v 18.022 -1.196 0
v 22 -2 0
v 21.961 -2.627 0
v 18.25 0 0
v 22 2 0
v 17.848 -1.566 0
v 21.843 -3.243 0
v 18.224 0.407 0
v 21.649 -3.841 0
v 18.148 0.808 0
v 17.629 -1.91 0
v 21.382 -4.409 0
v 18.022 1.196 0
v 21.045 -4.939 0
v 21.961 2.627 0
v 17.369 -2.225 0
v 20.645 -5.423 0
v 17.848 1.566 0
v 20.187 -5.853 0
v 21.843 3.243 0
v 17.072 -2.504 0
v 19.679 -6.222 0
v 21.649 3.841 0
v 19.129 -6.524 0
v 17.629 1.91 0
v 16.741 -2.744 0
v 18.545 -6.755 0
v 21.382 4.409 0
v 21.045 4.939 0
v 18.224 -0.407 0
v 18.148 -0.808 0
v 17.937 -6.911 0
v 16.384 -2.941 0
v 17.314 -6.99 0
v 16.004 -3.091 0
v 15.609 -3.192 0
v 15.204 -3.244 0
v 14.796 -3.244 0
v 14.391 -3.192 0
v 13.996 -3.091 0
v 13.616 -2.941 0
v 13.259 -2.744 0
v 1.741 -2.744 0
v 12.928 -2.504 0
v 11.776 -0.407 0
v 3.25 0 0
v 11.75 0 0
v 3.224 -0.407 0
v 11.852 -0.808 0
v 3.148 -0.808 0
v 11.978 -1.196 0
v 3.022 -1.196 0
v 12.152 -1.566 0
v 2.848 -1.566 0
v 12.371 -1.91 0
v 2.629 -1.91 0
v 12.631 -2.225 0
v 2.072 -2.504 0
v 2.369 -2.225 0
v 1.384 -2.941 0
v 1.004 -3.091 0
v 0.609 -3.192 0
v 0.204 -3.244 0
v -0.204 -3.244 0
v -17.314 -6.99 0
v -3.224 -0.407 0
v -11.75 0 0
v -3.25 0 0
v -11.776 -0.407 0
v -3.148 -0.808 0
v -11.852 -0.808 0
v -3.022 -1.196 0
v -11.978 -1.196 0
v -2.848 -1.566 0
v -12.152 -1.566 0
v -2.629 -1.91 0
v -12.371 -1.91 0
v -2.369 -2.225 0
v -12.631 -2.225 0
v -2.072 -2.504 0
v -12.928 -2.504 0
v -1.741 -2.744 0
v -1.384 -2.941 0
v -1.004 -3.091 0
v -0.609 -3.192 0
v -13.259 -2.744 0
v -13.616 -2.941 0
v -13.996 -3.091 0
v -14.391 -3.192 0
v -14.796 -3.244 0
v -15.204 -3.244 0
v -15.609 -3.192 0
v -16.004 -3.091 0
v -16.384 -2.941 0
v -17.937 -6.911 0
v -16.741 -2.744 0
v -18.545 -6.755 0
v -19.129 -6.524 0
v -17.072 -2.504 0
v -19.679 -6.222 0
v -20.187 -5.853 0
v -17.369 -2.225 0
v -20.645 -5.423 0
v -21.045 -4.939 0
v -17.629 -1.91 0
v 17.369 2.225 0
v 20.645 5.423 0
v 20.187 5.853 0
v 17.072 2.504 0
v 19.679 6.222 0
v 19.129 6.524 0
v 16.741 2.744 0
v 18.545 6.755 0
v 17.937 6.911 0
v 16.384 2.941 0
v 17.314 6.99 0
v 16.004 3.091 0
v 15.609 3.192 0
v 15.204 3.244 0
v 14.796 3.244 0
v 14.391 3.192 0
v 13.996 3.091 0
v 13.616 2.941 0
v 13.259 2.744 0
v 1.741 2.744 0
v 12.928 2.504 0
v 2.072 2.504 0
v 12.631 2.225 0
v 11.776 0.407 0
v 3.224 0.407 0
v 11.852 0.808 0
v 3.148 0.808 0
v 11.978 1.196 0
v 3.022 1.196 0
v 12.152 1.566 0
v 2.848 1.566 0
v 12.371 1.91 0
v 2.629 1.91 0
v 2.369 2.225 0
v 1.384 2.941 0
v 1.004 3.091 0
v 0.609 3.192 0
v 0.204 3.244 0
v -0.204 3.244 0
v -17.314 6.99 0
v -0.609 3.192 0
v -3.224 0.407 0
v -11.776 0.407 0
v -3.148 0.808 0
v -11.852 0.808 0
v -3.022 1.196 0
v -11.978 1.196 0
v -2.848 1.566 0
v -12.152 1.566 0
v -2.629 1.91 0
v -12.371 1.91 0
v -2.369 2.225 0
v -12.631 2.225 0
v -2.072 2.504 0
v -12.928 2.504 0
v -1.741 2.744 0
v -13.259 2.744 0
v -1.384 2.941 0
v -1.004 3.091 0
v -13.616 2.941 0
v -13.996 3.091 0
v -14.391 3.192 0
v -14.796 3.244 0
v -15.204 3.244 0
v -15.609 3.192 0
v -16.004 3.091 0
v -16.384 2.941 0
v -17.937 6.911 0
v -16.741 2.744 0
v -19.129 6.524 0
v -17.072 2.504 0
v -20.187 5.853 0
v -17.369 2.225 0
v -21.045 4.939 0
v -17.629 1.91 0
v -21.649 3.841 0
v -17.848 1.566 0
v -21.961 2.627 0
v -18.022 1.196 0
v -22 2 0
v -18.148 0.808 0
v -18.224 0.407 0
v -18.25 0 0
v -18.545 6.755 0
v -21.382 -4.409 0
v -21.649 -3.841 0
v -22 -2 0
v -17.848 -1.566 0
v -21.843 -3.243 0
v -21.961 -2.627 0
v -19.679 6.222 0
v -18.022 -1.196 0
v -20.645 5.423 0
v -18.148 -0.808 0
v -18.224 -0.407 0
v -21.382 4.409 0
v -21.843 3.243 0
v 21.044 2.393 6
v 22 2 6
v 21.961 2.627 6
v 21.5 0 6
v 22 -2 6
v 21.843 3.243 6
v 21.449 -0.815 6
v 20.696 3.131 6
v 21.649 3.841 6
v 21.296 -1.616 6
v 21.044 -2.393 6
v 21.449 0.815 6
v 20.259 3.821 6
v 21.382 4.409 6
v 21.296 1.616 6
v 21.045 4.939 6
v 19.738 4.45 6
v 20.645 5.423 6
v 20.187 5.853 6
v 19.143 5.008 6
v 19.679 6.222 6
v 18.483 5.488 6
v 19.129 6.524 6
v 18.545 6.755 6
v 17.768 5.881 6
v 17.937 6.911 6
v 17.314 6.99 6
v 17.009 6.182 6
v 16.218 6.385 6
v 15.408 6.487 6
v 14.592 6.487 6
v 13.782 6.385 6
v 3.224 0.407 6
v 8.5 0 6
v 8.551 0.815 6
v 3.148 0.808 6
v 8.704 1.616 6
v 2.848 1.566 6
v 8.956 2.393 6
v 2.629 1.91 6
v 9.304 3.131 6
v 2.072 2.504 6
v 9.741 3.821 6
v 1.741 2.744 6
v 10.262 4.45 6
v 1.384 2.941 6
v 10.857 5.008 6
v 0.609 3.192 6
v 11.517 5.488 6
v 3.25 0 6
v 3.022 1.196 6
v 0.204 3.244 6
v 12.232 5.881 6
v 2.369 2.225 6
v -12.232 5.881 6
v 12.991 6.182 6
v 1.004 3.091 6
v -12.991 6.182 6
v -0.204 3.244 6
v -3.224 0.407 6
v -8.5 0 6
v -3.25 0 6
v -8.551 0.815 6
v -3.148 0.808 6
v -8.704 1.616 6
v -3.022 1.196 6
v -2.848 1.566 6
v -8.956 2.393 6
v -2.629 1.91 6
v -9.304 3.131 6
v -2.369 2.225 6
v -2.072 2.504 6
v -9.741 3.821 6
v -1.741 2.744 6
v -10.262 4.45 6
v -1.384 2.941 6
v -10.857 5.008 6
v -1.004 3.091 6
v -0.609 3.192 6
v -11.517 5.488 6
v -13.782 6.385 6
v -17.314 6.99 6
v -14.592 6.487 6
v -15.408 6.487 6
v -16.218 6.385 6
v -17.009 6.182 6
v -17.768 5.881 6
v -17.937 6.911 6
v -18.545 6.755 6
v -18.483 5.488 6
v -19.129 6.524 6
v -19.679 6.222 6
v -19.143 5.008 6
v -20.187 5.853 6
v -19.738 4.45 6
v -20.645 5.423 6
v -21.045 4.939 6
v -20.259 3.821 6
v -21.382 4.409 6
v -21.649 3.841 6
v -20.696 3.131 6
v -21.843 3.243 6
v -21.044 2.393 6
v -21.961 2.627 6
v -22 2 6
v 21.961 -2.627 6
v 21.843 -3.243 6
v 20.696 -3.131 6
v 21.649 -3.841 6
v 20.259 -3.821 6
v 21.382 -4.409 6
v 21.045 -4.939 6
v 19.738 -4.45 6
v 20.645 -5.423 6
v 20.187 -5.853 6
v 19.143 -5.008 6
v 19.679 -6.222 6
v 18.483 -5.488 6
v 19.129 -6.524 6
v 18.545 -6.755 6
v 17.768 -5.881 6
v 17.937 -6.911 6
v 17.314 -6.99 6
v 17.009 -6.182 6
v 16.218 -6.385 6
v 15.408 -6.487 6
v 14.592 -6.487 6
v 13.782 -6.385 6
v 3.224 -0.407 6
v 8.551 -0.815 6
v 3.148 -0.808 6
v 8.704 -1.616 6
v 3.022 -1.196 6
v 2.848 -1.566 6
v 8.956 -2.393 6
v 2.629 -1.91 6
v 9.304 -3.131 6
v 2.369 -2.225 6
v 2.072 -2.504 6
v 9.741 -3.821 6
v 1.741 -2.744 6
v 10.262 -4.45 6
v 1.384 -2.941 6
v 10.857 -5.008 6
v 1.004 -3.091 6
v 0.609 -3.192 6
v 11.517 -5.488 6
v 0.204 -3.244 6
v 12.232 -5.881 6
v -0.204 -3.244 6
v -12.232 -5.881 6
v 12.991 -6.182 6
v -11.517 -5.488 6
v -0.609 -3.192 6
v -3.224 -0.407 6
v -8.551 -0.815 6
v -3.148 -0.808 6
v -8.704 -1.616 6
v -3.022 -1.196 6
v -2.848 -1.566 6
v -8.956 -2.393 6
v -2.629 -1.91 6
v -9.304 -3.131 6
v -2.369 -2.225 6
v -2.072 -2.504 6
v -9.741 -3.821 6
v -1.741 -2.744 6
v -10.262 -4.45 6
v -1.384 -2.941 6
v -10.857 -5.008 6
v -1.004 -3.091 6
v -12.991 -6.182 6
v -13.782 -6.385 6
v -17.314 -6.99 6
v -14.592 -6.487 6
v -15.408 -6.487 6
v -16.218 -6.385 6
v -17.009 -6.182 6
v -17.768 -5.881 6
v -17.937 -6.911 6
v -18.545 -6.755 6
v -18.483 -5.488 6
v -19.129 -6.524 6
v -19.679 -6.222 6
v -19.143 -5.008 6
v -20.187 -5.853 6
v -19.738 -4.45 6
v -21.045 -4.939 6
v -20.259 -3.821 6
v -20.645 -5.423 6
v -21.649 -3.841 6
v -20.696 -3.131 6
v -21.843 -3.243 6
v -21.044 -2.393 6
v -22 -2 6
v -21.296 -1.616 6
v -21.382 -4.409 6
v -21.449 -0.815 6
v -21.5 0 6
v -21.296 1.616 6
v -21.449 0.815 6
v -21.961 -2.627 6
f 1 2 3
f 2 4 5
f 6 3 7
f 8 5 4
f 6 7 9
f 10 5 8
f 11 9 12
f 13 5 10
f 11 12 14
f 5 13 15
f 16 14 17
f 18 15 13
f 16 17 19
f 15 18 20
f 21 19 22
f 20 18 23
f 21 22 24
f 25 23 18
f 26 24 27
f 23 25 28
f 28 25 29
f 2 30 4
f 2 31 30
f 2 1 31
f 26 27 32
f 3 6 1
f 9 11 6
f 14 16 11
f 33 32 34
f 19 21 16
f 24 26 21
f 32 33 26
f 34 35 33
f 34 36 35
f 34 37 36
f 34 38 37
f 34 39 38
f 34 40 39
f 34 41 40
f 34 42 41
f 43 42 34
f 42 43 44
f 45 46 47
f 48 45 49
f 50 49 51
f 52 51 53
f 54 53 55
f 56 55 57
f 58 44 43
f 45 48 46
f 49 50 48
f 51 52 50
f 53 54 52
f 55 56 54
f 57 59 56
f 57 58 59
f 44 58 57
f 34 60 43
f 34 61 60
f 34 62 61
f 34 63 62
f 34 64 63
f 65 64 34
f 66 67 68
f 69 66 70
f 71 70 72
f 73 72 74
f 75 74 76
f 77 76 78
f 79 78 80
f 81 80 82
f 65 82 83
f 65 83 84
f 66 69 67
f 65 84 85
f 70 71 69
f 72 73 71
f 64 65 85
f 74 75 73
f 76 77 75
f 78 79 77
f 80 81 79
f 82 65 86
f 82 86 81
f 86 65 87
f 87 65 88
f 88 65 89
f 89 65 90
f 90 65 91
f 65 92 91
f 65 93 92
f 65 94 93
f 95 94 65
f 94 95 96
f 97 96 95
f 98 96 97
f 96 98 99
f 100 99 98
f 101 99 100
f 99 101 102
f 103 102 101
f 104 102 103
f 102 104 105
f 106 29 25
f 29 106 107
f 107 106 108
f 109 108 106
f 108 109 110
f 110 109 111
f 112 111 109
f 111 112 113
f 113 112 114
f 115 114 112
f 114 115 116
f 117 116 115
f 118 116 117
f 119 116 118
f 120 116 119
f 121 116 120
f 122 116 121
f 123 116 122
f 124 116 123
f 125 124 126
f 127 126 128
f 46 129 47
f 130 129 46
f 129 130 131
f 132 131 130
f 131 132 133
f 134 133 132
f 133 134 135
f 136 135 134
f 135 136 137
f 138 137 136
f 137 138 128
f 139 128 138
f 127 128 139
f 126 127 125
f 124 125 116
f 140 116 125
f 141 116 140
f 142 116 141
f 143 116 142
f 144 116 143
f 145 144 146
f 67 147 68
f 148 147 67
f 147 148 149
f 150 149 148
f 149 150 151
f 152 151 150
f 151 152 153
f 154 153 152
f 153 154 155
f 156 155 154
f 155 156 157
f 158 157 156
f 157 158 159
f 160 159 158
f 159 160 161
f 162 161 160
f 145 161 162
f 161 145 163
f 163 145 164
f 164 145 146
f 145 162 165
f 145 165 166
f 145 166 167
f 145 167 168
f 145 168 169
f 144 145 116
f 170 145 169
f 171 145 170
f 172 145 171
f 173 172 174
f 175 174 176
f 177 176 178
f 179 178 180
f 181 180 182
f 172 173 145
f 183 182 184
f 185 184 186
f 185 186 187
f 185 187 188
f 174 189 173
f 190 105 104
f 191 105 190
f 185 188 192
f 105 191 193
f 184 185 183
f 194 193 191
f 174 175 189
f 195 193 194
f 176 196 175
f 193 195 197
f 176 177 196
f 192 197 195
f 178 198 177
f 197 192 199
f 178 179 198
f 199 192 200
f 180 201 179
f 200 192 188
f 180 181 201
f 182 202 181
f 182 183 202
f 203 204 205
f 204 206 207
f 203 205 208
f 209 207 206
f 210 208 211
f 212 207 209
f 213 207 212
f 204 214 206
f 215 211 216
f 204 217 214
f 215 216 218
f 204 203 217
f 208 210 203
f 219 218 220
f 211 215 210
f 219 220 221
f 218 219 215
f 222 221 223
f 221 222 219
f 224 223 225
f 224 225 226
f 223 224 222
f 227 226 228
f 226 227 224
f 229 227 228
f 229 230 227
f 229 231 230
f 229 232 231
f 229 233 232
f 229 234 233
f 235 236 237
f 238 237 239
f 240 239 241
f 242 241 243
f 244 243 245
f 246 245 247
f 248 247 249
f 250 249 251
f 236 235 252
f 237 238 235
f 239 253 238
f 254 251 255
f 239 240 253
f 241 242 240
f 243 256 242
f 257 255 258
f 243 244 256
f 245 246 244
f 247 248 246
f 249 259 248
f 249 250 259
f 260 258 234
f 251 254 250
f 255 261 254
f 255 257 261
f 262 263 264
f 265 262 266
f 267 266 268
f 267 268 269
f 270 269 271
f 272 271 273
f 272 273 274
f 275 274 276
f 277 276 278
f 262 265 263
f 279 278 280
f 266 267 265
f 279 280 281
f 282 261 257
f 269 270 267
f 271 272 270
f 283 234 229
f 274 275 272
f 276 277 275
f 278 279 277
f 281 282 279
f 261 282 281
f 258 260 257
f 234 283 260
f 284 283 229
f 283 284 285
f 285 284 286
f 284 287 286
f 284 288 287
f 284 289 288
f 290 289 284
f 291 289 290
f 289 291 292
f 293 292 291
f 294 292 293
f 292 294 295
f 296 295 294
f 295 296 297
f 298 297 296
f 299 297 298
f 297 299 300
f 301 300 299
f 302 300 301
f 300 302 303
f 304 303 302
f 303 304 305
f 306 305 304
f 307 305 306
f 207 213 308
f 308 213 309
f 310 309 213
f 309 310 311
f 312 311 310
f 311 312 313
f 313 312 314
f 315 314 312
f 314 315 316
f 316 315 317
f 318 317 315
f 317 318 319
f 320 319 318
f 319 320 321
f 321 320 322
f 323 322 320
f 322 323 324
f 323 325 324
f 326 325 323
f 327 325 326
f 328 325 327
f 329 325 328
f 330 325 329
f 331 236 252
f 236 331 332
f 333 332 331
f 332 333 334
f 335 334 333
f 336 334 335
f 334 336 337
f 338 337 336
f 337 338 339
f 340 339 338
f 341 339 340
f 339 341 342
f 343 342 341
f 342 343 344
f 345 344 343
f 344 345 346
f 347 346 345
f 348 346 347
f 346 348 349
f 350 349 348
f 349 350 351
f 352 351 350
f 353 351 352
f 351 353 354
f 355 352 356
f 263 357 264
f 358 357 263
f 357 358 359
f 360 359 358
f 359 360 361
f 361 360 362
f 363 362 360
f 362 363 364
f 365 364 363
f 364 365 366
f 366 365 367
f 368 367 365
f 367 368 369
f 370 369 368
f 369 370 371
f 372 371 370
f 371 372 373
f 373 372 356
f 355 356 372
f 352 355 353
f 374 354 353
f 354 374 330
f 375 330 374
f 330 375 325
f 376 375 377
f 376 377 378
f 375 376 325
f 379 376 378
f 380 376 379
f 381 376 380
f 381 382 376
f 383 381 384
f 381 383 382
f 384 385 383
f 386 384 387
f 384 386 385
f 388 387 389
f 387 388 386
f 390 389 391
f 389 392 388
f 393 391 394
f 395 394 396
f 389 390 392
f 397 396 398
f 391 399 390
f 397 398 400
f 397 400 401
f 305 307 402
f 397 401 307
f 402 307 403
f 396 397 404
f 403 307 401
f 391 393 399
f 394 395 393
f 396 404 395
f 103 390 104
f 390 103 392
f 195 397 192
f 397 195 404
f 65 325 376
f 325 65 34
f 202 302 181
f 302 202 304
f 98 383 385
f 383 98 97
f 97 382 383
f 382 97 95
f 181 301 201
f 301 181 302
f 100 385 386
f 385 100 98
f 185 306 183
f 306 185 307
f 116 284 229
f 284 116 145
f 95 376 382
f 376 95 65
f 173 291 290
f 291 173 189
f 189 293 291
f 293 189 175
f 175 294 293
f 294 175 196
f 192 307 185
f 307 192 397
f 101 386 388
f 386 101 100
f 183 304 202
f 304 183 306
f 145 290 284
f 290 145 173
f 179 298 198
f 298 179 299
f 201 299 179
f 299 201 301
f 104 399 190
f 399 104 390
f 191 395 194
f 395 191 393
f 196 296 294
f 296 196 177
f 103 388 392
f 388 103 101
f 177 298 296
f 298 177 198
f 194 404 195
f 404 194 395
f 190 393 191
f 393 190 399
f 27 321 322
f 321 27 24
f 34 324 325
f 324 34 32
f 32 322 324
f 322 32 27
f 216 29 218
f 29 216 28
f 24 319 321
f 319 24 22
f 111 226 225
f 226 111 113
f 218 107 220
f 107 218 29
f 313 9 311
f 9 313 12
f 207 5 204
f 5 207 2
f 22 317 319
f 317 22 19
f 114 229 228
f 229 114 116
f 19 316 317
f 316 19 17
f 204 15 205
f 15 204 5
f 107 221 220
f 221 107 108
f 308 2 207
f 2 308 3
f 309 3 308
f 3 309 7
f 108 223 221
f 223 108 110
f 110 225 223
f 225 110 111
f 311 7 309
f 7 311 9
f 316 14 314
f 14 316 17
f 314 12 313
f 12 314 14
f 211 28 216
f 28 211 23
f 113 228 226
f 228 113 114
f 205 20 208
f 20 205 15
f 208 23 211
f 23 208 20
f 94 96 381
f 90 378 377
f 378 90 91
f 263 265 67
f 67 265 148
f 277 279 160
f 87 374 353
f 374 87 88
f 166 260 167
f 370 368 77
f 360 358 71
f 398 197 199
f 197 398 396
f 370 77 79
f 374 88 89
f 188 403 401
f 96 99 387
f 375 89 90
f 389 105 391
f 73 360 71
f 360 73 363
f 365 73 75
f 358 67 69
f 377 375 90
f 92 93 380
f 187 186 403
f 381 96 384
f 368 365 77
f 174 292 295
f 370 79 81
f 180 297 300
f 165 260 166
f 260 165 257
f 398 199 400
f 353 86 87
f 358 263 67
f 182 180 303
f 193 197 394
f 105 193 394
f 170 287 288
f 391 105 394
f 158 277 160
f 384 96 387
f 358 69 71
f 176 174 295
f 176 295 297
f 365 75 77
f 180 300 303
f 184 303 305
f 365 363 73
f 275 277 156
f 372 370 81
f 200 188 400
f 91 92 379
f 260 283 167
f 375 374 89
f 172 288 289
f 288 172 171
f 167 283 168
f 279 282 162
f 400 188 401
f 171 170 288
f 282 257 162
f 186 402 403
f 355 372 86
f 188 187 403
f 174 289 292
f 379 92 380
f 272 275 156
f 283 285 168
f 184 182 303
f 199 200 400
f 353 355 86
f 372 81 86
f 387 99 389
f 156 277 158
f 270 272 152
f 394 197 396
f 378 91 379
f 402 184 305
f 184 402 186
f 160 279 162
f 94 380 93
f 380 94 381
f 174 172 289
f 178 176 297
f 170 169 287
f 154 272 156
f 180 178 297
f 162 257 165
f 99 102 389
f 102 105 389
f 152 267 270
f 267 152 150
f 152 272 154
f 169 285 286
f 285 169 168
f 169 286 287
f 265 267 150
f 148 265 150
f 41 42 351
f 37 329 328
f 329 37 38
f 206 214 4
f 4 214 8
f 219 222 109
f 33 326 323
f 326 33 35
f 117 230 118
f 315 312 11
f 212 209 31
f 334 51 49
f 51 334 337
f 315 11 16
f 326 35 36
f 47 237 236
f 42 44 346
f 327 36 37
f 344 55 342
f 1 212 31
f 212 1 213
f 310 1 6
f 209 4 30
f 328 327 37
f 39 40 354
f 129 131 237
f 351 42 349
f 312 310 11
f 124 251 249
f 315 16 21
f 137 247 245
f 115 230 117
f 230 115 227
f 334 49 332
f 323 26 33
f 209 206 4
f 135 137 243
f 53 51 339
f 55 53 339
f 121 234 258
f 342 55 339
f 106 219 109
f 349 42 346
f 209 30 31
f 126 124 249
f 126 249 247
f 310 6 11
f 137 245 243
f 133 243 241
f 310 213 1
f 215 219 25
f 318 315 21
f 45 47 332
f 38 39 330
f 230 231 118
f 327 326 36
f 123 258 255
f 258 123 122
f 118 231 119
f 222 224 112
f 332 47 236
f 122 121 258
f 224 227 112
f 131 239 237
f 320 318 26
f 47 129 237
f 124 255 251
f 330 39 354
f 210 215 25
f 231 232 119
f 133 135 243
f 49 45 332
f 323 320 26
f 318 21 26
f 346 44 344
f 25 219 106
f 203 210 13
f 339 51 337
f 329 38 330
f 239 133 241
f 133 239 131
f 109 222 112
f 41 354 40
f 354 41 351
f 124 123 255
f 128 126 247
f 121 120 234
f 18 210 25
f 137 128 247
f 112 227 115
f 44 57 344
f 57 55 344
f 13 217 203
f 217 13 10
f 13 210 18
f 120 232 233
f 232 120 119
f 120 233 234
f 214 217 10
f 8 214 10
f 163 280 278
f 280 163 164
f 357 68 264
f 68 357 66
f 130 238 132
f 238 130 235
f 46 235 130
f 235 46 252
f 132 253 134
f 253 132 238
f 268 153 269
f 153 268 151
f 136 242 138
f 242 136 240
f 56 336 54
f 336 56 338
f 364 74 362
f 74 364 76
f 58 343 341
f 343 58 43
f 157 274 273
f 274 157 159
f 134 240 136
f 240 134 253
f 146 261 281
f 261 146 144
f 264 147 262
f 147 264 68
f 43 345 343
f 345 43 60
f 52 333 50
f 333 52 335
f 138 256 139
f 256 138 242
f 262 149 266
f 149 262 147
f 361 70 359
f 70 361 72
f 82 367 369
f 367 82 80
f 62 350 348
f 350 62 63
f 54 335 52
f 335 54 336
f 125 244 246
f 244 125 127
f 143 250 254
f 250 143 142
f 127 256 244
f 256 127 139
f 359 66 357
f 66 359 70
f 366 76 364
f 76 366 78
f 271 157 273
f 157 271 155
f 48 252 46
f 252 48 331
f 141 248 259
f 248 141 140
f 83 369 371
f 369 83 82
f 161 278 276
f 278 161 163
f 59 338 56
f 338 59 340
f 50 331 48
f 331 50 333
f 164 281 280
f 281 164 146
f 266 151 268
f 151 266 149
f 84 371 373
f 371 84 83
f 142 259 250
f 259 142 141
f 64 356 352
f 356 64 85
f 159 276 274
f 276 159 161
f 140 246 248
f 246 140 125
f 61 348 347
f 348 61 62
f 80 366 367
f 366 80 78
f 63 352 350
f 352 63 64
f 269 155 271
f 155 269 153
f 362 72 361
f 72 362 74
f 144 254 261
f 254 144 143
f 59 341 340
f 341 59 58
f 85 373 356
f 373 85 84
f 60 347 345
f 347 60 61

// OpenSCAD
$fn = 50;


difference() {
	union() {
		cylinder(h = 6, r = 7.0000000000);
		translate(v = [-7.5000000000, 0.0000000000, 0]) {
			hull() {
				translate(v = [-9.5000000000, 2.0000000000, 0]) {
					cylinder(h = 6, r = 5);
				}
				translate(v = [9.5000000000, 2.0000000000, 0]) {
					cylinder(h = 6, r = 5);
				}
				translate(v = [-9.5000000000, -2.0000000000, 0]) {
					cylinder(h = 6, r = 5);
				}
				translate(v = [9.5000000000, -2.0000000000, 0]) {
					cylinder(h = 6, r = 5);
				}
			}
		}
		translate(v = [-7.5000000000, 0.0000000000, 0]) {
			hull() {
				translate(v = [-9.5000000000, 2.0000000000, 0]) {
					cylinder(h = 6, r = 5);
				}
				translate(v = [9.5000000000, 2.0000000000, 0]) {
					cylinder(h = 6, r = 5);
				}
				translate(v = [-9.5000000000, -2.0000000000, 0]) {
					cylinder(h = 6, r = 5);
				}
				translate(v = [9.5000000000, -2.0000000000, 0]) {
					cylinder(h = 6, r = 5);
				}
			}
		}
		translate(v = [7.5000000000, 0.0000000000, 0]) {
			hull() {
				translate(v = [-9.5000000000, 2.0000000000, 0]) {
					cylinder(h = 6, r = 5);
				}
				translate(v = [9.5000000000, 2.0000000000, 0]) {
					cylinder(h = 6, r = 5);
				}
				translate(v = [-9.5000000000, -2.0000000000, 0]) {
					cylinder(h = 6, r = 5);
				}
				translate(v = [9.5000000000, -2.0000000000, 0]) {
					cylinder(h = 6, r = 5);
				}
			}
		}
		translate(v = [7.5000000000, 0.0000000000, 0]) {
			hull() {
				translate(v = [-9.5000000000, 2.0000000000, 0]) {
					cylinder(h = 6, r = 5);
				}
				translate(v = [9.5000000000, 2.0000000000, 0]) {
					cylinder(h = 6, r = 5);
				}
				translate(v = [-9.5000000000, -2.0000000000, 0]) {
					cylinder(h = 6, r = 5);
				}
				translate(v = [9.5000000000, -2.0000000000, 0]) {
					cylinder(h = 6, r = 5);
				}
			}
		}
	}
	union() {
		translate(v = [-15.0000000000, 0.0000000000, 6]) {
			rotate(a = [0, 0, 0]) {
				difference() {
					union() {
						#translate(v = [0, 0, -6.0000000000]) {
							cylinder(h = 6, r = 2.2500000000);
						}
						#translate(v = [0, 0, -6]) {
							cylinder(h = 6, r1 = 3.2500000000, r2 = 6.5000000000);
						}
						#translate(v = [0, 0, -6.0000000000]) {
							cylinder(h = 6, r = 3.2500000000);
						}
						#translate(v = [0, 0, -6.0000000000]) {
							cylinder(h = 6, r = 2.2500000000);
						}
					}
					union();
				}
			}
		}
		translate(v = [-15.0000000000, 0.0000000000, 6]) {
			rotate(a = [0, 0, 0]) {
				difference() {
					union() {
						#translate(v = [0, 0, -6.0000000000]) {
							cylinder(h = 6, r = 2.2500000000);
						}
						#translate(v = [0, 0, -6]) {
							cylinder(h = 6, r1 = 3.2500000000, r2 = 6.5000000000);
						}
						#translate(v = [0, 0, -6.0000000000]) {
							cylinder(h = 6, r = 3.2500000000);
						}
						#translate(v = [0, 0, -6.0000000000]) {
							cylinder(h = 6, r = 2.2500000000);
						}
					}
					union();
				}
			}
		}
		translate(v = [15.0000000000, 0.0000000000, 6]) {
			rotate(a = [0, 0, 0]) {
				difference() {
					union() {
						#translate(v = [0, 0, -6.0000000000]) {
							cylinder(h = 6, r = 2.2500000000);
						}
						#translate(v = [0, 0, -6]) {
							cylinder(h = 6, r1 = 3.2500000000, r2 = 6.5000000000);
						}
						#translate(v = [0, 0, -6.0000000000]) {
							cylinder(h = 6, r = 3.2500000000);
						}
						#translate(v = [0, 0, -6.0000000000]) {
							cylinder(h = 6, r = 2.2500000000);
						}
					}
					union();
				}
			}
		}
		translate(v = [15.0000000000, 0.0000000000, 6]) {
			rotate(a = [0, 0, 0]) {
				difference() {
					union() {
						#translate(v = [0, 0, -6.0000000000]) {
							cylinder(h = 6, r = 2.2500000000);
						}
						#translate(v = [0, 0, -6]) {
							cylinder(h = 6, r1 = 3.2500000000, r2 = 6.5000000000);
						}
						#translate(v = [0, 0, -6.0000000000]) {
							cylinder(h = 6, r = 3.2500000000);
						}
						#translate(v = [0, 0, -6.0000000000]) {
							cylinder(h = 6, r = 2.2500000000);
						}
					}
					union();
				}
			}
		}
		translate(v = [0, 0, -100]) {
			cylinder(h = 200, r = 3.2500000000);
		}
		translate(v = [0, 0, -100]) {
			cylinder(h = 200, r = 1.8000000000);
		}
	}
}
